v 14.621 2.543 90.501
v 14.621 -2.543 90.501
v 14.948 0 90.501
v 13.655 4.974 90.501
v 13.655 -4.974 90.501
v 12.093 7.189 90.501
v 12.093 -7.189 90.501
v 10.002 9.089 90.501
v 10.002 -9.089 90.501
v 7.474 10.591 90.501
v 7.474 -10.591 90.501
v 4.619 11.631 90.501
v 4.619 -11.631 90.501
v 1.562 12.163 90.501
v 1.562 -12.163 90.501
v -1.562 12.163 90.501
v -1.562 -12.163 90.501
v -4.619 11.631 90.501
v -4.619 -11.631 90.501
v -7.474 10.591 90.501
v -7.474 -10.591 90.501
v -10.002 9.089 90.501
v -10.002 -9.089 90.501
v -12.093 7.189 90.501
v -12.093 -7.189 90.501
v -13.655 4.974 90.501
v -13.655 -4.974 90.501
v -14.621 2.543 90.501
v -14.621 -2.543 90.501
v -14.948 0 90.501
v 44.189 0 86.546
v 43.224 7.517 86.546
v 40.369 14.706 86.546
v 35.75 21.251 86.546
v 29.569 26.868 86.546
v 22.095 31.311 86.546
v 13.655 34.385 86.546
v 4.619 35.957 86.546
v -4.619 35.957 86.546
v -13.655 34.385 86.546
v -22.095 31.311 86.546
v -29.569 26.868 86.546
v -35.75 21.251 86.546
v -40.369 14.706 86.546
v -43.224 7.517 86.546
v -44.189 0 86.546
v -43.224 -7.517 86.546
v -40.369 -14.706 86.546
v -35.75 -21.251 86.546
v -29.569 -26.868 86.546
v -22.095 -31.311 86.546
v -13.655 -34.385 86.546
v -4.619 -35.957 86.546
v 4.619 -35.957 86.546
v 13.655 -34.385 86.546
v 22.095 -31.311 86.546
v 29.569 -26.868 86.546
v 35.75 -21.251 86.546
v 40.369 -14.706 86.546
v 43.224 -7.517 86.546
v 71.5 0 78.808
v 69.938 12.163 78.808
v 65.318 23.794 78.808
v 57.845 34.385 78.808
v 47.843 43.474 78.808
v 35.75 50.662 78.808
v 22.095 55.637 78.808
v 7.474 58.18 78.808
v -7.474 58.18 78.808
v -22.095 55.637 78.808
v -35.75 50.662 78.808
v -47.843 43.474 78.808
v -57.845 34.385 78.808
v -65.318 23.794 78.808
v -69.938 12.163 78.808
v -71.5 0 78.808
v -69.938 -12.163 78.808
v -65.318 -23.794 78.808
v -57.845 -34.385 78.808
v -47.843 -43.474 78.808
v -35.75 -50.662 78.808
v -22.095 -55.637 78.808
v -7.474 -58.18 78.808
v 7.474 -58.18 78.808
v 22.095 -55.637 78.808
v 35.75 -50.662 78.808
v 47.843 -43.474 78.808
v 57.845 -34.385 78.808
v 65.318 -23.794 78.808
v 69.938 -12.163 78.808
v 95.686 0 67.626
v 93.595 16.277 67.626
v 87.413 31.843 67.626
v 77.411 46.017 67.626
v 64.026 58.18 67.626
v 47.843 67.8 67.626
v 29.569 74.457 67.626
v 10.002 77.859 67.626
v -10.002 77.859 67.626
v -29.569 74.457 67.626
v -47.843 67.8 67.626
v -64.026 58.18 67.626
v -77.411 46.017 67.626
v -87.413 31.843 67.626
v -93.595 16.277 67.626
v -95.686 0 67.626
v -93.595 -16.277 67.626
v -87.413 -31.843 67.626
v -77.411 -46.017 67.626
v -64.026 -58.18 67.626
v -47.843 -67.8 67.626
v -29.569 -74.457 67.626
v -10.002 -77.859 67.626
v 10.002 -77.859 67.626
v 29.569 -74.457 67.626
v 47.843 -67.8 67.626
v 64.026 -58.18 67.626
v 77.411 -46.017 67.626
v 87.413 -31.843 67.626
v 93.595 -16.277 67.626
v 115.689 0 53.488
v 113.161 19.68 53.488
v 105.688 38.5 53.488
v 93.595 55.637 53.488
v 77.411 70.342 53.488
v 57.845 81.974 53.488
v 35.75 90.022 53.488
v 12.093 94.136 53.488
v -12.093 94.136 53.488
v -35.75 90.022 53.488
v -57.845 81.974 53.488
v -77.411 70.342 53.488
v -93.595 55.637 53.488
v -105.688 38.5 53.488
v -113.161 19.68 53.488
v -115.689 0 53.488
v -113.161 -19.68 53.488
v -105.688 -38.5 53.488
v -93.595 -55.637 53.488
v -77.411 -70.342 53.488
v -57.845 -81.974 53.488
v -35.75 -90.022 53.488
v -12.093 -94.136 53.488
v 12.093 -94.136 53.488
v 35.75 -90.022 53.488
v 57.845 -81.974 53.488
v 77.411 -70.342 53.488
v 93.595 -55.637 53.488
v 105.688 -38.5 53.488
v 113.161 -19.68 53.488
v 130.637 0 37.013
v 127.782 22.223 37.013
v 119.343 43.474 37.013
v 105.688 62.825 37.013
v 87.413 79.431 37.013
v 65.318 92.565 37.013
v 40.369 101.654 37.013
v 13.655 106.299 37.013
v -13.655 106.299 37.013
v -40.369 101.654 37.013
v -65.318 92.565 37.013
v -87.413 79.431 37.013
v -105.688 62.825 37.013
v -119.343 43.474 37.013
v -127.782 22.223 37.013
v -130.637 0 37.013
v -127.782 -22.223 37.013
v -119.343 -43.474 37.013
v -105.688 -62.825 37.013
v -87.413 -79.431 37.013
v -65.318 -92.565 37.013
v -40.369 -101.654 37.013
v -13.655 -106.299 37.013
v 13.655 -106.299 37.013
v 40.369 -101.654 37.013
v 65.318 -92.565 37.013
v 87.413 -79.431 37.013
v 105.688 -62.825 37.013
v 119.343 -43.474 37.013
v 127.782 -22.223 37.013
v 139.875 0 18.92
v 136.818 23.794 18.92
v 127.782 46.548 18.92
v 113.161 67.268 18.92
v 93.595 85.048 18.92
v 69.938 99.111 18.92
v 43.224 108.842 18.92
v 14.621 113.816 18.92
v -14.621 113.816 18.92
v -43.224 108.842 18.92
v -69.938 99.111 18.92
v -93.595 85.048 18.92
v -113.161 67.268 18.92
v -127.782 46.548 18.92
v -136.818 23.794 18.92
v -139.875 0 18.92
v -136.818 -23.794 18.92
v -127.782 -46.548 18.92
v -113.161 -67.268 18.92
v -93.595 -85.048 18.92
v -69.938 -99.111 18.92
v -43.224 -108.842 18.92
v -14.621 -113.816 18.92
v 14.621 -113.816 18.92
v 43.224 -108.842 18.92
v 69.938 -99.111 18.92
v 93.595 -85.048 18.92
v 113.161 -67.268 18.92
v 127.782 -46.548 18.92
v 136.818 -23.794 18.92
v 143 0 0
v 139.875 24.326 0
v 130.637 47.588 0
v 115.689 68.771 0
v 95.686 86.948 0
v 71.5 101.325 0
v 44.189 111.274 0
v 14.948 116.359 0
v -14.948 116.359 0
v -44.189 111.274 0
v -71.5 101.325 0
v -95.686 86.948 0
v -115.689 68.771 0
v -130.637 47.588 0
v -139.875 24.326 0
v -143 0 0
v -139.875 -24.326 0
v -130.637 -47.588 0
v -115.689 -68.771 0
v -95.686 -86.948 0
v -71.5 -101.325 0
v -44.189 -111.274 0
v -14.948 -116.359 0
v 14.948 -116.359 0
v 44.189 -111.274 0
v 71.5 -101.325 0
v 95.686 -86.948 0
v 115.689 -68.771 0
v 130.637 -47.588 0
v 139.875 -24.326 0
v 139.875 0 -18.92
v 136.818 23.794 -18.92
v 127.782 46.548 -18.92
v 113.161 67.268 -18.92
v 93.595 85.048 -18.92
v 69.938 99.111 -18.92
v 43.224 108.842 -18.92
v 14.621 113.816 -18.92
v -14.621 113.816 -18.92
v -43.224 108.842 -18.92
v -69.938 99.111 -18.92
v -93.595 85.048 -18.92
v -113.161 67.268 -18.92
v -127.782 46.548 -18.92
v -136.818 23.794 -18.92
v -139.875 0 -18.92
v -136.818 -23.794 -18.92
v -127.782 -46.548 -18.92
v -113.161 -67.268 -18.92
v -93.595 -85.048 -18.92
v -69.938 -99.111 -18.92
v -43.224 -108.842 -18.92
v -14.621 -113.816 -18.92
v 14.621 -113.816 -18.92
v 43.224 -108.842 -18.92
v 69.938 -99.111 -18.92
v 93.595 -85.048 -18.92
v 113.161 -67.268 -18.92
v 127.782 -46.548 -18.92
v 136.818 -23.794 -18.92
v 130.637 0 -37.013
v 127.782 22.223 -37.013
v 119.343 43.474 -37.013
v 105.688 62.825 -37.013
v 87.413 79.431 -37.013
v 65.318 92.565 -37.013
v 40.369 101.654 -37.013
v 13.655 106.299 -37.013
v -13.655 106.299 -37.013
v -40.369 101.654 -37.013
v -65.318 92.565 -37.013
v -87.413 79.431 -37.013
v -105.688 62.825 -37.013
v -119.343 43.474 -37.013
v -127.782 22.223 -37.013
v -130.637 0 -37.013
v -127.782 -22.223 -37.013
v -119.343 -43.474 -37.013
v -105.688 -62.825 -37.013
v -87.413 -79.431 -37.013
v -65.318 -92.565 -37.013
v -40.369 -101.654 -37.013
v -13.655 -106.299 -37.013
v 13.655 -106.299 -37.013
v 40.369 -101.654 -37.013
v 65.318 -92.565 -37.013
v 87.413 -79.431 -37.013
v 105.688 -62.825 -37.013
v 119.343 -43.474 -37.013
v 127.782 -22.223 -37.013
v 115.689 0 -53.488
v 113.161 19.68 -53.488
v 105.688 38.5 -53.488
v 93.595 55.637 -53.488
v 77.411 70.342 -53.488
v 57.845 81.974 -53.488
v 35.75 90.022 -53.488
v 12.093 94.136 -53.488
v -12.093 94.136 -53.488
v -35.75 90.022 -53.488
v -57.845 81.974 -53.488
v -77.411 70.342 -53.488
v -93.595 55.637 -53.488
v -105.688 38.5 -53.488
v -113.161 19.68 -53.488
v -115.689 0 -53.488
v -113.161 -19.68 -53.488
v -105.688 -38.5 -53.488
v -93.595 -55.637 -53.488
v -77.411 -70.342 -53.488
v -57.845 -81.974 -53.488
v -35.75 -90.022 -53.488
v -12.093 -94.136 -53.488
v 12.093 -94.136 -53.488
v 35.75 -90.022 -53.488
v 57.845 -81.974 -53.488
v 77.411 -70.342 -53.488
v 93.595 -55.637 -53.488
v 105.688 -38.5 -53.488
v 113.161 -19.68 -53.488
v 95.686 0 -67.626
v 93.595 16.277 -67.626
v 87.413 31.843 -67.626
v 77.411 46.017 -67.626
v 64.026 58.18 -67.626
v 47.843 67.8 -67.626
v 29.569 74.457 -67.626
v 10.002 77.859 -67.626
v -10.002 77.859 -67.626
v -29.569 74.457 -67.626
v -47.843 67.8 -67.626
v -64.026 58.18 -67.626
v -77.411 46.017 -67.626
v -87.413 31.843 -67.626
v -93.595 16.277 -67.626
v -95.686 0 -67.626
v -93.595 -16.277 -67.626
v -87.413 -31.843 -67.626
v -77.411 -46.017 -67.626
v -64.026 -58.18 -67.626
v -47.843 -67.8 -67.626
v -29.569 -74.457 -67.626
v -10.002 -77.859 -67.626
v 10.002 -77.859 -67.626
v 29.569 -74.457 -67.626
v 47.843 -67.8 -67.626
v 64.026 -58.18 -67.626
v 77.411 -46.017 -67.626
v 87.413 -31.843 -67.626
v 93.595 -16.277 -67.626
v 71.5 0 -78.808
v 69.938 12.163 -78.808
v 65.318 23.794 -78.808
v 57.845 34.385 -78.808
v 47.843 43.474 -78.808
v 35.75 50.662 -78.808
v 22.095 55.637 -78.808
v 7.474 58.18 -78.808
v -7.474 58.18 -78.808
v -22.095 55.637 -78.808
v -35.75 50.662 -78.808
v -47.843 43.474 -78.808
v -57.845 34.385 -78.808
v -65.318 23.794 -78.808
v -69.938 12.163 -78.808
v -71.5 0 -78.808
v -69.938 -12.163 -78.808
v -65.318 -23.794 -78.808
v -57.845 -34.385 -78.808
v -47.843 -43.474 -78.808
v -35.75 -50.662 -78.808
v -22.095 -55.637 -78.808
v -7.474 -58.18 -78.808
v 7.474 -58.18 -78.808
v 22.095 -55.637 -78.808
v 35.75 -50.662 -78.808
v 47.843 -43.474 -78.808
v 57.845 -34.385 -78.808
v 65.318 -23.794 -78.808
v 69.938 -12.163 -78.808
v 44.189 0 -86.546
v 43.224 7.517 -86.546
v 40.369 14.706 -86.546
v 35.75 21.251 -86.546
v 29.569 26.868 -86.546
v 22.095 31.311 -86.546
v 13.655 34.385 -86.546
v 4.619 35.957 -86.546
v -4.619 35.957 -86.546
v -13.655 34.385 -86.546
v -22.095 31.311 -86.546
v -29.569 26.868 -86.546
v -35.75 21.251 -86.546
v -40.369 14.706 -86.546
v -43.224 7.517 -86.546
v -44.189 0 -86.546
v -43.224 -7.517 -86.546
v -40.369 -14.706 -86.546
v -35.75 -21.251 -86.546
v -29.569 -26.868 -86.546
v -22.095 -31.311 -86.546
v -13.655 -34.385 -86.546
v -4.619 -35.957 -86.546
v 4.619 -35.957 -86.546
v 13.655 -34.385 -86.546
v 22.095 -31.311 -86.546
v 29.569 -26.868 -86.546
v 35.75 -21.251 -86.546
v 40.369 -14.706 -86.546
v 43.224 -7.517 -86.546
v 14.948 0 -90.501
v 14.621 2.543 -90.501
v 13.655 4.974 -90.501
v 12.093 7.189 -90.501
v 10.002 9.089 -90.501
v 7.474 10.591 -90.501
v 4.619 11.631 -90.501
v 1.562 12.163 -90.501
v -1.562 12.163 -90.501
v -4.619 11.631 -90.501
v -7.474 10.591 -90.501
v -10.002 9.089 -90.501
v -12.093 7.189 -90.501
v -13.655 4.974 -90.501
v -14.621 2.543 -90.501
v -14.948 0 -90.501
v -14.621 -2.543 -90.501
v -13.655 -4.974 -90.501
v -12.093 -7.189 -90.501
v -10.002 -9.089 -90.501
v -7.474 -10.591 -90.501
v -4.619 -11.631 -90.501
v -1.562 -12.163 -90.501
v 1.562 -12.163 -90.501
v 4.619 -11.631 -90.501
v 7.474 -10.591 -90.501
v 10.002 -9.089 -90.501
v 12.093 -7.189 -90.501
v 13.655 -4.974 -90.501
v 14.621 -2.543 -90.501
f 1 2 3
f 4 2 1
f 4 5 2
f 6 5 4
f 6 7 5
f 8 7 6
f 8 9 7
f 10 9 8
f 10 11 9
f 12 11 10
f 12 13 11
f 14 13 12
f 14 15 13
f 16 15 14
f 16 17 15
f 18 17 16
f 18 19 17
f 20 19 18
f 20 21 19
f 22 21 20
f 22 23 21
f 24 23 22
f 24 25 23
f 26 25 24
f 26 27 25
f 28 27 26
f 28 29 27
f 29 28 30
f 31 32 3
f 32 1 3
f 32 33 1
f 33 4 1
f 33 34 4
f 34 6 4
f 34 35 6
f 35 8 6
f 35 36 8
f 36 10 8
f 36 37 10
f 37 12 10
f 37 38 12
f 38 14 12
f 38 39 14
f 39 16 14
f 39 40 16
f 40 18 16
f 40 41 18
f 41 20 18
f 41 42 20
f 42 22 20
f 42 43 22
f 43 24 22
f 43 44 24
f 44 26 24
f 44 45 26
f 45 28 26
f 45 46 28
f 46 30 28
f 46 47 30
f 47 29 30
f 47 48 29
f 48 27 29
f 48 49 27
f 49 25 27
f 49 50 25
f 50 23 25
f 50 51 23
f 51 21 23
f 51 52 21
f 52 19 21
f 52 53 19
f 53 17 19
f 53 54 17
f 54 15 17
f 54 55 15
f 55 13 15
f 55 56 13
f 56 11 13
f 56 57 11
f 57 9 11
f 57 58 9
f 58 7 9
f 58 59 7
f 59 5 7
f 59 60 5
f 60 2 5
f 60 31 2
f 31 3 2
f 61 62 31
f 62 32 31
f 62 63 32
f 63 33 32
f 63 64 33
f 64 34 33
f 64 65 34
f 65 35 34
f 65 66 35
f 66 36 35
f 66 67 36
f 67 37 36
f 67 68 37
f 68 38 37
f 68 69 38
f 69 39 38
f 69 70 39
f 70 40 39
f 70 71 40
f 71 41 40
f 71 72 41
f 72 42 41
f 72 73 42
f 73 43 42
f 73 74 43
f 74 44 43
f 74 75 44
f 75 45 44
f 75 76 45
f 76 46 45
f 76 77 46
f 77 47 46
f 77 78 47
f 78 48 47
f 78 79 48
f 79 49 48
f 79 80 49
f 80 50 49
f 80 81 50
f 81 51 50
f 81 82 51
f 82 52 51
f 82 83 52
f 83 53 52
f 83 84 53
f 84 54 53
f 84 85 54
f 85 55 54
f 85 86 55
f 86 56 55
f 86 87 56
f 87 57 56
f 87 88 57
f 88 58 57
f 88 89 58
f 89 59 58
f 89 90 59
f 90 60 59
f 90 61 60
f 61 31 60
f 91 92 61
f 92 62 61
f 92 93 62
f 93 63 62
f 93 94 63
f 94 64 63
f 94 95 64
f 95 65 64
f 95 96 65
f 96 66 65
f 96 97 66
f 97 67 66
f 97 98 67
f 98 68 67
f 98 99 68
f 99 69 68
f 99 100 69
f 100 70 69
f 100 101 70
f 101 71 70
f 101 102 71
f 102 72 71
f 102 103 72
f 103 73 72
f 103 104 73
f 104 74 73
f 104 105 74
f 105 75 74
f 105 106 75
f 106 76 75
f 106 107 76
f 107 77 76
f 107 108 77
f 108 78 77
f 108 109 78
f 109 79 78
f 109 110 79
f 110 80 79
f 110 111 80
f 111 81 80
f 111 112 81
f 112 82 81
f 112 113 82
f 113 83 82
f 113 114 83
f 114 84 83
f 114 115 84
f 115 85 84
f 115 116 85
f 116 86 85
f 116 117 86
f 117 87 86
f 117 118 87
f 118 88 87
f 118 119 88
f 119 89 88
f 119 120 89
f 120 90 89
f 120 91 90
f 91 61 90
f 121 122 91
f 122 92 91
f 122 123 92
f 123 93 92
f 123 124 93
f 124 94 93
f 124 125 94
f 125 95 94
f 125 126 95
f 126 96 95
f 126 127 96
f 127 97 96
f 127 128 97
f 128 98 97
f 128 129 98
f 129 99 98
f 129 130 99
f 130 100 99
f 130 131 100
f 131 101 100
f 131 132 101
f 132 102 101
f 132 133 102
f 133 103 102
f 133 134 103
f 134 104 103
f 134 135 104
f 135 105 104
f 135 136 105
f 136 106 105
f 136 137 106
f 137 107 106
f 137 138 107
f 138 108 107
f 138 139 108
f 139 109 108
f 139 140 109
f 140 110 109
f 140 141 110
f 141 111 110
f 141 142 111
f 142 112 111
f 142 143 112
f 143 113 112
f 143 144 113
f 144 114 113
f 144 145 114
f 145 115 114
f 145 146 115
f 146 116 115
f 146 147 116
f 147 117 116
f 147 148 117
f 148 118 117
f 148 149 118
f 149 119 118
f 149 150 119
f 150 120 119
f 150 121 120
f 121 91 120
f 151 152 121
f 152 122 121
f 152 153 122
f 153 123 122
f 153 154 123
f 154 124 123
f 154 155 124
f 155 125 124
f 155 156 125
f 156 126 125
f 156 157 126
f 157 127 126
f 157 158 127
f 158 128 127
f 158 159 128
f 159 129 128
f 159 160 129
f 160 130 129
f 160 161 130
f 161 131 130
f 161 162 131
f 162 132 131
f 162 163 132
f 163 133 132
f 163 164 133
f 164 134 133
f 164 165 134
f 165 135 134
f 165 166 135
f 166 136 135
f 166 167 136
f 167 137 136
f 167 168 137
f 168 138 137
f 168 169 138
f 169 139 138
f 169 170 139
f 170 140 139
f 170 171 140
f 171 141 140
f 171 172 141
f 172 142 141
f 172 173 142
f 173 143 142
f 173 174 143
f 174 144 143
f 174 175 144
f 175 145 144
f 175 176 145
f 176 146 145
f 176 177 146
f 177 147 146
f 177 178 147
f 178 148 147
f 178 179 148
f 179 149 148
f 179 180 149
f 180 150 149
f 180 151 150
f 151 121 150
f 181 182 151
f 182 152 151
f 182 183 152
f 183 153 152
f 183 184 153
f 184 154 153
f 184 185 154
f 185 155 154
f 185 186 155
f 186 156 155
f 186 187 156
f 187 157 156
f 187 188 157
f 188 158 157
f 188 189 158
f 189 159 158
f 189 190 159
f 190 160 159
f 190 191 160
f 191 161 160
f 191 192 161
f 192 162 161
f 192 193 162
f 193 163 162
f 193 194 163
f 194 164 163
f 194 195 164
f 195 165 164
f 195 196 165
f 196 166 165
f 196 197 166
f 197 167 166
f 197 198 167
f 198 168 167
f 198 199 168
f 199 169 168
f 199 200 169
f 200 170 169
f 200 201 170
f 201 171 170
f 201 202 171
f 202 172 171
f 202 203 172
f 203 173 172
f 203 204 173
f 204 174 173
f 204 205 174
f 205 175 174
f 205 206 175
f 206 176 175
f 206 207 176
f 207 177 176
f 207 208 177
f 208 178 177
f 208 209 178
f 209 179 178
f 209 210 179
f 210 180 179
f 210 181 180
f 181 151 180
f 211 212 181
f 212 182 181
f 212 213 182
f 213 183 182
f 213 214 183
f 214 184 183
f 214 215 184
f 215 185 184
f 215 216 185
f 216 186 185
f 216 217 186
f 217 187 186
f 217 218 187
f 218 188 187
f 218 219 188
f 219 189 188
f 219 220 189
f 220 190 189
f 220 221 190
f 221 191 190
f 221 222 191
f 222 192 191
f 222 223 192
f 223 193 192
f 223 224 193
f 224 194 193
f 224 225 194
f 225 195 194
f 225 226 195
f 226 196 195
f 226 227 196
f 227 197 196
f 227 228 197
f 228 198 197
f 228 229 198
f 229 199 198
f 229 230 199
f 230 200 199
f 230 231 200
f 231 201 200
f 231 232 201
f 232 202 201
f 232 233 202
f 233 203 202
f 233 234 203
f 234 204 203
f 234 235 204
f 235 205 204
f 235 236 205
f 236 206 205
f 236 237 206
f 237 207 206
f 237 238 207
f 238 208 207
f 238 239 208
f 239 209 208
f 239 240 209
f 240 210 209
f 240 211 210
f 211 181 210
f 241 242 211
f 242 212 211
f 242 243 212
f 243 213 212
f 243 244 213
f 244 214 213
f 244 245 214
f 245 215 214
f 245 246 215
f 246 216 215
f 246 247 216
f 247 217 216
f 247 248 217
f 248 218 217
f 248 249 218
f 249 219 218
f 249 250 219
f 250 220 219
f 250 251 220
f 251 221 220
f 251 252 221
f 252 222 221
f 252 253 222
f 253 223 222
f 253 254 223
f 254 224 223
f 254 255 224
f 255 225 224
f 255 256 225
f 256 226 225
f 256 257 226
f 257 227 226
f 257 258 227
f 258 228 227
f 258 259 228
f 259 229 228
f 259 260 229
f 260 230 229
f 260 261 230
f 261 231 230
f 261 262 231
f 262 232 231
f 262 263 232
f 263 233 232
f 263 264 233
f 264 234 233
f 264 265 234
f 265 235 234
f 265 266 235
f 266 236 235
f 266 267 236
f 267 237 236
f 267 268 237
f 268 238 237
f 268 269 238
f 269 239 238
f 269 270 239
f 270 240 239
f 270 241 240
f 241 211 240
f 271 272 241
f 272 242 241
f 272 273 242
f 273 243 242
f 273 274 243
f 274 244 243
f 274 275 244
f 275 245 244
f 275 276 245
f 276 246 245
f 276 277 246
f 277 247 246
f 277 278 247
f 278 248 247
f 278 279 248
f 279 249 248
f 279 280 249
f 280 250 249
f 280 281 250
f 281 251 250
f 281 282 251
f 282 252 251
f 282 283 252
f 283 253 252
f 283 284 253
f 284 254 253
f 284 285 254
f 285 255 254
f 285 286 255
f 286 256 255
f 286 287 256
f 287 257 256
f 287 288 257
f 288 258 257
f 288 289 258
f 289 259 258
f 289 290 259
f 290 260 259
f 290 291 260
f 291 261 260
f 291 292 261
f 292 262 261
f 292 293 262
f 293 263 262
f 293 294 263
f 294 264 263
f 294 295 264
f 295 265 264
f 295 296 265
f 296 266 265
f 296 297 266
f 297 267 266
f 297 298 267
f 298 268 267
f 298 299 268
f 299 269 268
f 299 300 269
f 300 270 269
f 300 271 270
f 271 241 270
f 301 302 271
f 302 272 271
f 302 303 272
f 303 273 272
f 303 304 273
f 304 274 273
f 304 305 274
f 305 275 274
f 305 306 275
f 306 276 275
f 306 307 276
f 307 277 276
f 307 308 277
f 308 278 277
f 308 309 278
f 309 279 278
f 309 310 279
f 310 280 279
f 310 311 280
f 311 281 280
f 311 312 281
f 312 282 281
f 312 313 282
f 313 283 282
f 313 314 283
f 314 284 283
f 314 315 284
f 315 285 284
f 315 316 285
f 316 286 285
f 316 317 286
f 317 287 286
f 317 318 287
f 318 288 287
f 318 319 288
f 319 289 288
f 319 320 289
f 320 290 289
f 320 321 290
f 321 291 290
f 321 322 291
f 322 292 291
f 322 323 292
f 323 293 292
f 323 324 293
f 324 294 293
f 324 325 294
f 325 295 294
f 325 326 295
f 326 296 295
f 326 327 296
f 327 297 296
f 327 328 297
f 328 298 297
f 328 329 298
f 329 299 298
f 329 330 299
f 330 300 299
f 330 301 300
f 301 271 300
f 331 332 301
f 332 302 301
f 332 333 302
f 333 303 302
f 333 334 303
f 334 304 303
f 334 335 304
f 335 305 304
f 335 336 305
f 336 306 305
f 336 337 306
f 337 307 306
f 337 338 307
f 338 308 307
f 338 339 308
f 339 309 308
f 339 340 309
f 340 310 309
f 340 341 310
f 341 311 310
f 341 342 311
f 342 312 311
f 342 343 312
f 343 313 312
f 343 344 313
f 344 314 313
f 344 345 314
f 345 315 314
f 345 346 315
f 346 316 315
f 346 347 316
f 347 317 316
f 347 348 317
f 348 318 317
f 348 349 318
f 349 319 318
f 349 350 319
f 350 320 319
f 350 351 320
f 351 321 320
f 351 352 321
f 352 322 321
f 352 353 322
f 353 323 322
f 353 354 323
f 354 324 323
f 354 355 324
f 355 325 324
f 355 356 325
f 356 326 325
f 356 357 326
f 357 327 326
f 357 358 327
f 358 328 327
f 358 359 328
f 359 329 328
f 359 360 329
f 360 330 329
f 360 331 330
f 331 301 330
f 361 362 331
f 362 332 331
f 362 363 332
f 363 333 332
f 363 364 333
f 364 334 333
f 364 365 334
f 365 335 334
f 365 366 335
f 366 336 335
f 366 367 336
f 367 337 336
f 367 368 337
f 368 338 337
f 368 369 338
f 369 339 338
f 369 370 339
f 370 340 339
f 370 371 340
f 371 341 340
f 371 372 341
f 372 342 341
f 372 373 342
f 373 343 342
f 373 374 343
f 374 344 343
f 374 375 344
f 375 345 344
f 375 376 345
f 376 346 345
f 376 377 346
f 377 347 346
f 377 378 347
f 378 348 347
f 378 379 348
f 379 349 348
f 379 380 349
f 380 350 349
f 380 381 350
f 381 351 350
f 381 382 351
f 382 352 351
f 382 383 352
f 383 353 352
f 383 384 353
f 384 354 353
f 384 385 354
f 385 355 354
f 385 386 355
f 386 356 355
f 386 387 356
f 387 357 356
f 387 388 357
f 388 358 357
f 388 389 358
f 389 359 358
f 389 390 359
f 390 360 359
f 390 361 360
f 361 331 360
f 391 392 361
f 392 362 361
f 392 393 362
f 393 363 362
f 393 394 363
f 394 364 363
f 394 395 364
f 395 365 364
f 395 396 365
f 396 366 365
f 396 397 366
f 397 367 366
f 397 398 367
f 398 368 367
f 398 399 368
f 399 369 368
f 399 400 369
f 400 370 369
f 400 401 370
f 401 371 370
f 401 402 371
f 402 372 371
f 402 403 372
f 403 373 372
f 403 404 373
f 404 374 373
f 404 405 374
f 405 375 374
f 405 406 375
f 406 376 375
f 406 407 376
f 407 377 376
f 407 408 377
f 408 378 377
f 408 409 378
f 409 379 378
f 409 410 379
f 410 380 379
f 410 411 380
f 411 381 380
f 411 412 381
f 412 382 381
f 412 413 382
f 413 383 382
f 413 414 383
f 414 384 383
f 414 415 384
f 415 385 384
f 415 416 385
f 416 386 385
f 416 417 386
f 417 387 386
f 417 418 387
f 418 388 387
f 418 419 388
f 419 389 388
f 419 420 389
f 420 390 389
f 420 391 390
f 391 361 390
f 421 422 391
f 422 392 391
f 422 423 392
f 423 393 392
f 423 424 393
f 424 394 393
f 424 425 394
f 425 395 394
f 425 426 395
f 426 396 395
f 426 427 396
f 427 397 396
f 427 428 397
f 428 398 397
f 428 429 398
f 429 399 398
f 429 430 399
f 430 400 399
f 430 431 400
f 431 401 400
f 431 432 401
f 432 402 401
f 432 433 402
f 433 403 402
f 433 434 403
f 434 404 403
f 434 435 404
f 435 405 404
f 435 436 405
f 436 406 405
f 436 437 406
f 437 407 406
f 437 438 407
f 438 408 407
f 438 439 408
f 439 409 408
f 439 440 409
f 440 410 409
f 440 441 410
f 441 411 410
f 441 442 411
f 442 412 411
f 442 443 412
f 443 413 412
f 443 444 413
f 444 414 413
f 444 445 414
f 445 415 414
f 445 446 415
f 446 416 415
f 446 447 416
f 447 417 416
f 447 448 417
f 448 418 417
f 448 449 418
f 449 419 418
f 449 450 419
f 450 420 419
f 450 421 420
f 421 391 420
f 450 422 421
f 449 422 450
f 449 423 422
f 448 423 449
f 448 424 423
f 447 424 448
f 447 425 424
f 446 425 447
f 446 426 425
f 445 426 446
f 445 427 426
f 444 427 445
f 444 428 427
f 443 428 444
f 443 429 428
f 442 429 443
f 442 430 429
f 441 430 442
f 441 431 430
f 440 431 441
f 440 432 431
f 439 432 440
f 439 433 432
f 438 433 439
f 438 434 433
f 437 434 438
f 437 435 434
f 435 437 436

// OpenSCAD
// Generated by SolidPython 1.0.1 on 2020-07-29 00:46:49


scale(v = [11, 9, 7]) {
	sphere(r = 13);
}
/***********************************************
*********      SolidPython code:      **********
************************************************
 
# import packages: SolidPython
from solid import *
from solid.utils import *
from itertools import chain, combinations, permutations


class Resize:

    def __init__(self, scad_file):
        self.scad_file = scad_file
        #self.scad_file = import_scad(scad_file)
        # cone/cylinder param:
        self.r1 = 0
        self.r2 = 0
        self.h = 0
        # rectangular prism param:
        self.w = 0
        self.l = 0
        # ellipse param:
        self.r = 0

    # import OpenScad code (file name corresponds to shape)


    # classify shape + parameters
    def assign(self, param1, param2, param3):
        if self.scad_file == 'cone.scad':
            self.r1 = param1
            self.r2 = param2
            self.h = param3
        elif self.scad_file == 'cylinder.scad':
            self.r1 = param1
            self.r2 = param2
            self.h = param3
        elif self.scad_file == 'rectangularPrism.scad':
            self.h = param1
            self.l = param2
            self.w = param3
        else:
            self.r = param1
            self.h = param2

    # resize parameters
    def iterate(self):
        x = range(3, 20, 2)
        i = 1
        if self.scad_file == 'cone.scad':
            tempList = list(permutations(x, 2))
            for temp in tempList:
                param1 = temp[0]
                param2 = temp[1]
                filepath = 'produced_scad_files/' + 'cone' + str(param1) + '_' + str(param2) + '_' + '.scad'
                scad_render_to_file(cylinder(h=param1, r1=param2, r2=0), filepath)

        elif self.scad_file == 'cylinder.scad':
            tempList = list(permutations(x, 3))
            for temp in tempList:
                param1 = temp[0]
                param2 = temp[1]
                filepath = 'produced_scad_files/' + 'cylinder' + str(param1) + '_' + str(param2) + '_' + '.scad'
                scad_render_to_file(cylinder(h=param1, r1=param2, r2=param2), filepath)

        elif self.scad_file == 'rectangularPrism.scad':
            tempList = list(permutations(x, 3))
            for temp in tempList:
                param1 = temp[0]
                param2 = temp[1]
                param3 = temp[2]
                filepath = 'produced_scad_files/' + 'rectangularPrism' + str(param1) + '_' + str(param2) + '_' + str(
                    param3) + '.scad'
                scad_render_to_file(cube(size=(param1, param2, param3)), filepath)

        elif self.scad_file == 'ellipse.scad':
            tempList = list(permutations(x, 4))
            for temp in tempList:
                param1 = temp[0]
                param2 = temp[1]
                param3 = temp[2]
                param4 = temp[3]
                filepath = 'produced_scad_files/' + 'ellipse' + str(param1) + '_' + str(param2) + '_' + str(param3) + '_' + str(param4) + '.scad'
                scad_render_to_file(scale([param1, param2, param3])(sphere(r=param4)), filepath)

    def render_to_scadfile(self):
        scad_render_to_file(scad, 'example.scad') 
 
************************************************/
